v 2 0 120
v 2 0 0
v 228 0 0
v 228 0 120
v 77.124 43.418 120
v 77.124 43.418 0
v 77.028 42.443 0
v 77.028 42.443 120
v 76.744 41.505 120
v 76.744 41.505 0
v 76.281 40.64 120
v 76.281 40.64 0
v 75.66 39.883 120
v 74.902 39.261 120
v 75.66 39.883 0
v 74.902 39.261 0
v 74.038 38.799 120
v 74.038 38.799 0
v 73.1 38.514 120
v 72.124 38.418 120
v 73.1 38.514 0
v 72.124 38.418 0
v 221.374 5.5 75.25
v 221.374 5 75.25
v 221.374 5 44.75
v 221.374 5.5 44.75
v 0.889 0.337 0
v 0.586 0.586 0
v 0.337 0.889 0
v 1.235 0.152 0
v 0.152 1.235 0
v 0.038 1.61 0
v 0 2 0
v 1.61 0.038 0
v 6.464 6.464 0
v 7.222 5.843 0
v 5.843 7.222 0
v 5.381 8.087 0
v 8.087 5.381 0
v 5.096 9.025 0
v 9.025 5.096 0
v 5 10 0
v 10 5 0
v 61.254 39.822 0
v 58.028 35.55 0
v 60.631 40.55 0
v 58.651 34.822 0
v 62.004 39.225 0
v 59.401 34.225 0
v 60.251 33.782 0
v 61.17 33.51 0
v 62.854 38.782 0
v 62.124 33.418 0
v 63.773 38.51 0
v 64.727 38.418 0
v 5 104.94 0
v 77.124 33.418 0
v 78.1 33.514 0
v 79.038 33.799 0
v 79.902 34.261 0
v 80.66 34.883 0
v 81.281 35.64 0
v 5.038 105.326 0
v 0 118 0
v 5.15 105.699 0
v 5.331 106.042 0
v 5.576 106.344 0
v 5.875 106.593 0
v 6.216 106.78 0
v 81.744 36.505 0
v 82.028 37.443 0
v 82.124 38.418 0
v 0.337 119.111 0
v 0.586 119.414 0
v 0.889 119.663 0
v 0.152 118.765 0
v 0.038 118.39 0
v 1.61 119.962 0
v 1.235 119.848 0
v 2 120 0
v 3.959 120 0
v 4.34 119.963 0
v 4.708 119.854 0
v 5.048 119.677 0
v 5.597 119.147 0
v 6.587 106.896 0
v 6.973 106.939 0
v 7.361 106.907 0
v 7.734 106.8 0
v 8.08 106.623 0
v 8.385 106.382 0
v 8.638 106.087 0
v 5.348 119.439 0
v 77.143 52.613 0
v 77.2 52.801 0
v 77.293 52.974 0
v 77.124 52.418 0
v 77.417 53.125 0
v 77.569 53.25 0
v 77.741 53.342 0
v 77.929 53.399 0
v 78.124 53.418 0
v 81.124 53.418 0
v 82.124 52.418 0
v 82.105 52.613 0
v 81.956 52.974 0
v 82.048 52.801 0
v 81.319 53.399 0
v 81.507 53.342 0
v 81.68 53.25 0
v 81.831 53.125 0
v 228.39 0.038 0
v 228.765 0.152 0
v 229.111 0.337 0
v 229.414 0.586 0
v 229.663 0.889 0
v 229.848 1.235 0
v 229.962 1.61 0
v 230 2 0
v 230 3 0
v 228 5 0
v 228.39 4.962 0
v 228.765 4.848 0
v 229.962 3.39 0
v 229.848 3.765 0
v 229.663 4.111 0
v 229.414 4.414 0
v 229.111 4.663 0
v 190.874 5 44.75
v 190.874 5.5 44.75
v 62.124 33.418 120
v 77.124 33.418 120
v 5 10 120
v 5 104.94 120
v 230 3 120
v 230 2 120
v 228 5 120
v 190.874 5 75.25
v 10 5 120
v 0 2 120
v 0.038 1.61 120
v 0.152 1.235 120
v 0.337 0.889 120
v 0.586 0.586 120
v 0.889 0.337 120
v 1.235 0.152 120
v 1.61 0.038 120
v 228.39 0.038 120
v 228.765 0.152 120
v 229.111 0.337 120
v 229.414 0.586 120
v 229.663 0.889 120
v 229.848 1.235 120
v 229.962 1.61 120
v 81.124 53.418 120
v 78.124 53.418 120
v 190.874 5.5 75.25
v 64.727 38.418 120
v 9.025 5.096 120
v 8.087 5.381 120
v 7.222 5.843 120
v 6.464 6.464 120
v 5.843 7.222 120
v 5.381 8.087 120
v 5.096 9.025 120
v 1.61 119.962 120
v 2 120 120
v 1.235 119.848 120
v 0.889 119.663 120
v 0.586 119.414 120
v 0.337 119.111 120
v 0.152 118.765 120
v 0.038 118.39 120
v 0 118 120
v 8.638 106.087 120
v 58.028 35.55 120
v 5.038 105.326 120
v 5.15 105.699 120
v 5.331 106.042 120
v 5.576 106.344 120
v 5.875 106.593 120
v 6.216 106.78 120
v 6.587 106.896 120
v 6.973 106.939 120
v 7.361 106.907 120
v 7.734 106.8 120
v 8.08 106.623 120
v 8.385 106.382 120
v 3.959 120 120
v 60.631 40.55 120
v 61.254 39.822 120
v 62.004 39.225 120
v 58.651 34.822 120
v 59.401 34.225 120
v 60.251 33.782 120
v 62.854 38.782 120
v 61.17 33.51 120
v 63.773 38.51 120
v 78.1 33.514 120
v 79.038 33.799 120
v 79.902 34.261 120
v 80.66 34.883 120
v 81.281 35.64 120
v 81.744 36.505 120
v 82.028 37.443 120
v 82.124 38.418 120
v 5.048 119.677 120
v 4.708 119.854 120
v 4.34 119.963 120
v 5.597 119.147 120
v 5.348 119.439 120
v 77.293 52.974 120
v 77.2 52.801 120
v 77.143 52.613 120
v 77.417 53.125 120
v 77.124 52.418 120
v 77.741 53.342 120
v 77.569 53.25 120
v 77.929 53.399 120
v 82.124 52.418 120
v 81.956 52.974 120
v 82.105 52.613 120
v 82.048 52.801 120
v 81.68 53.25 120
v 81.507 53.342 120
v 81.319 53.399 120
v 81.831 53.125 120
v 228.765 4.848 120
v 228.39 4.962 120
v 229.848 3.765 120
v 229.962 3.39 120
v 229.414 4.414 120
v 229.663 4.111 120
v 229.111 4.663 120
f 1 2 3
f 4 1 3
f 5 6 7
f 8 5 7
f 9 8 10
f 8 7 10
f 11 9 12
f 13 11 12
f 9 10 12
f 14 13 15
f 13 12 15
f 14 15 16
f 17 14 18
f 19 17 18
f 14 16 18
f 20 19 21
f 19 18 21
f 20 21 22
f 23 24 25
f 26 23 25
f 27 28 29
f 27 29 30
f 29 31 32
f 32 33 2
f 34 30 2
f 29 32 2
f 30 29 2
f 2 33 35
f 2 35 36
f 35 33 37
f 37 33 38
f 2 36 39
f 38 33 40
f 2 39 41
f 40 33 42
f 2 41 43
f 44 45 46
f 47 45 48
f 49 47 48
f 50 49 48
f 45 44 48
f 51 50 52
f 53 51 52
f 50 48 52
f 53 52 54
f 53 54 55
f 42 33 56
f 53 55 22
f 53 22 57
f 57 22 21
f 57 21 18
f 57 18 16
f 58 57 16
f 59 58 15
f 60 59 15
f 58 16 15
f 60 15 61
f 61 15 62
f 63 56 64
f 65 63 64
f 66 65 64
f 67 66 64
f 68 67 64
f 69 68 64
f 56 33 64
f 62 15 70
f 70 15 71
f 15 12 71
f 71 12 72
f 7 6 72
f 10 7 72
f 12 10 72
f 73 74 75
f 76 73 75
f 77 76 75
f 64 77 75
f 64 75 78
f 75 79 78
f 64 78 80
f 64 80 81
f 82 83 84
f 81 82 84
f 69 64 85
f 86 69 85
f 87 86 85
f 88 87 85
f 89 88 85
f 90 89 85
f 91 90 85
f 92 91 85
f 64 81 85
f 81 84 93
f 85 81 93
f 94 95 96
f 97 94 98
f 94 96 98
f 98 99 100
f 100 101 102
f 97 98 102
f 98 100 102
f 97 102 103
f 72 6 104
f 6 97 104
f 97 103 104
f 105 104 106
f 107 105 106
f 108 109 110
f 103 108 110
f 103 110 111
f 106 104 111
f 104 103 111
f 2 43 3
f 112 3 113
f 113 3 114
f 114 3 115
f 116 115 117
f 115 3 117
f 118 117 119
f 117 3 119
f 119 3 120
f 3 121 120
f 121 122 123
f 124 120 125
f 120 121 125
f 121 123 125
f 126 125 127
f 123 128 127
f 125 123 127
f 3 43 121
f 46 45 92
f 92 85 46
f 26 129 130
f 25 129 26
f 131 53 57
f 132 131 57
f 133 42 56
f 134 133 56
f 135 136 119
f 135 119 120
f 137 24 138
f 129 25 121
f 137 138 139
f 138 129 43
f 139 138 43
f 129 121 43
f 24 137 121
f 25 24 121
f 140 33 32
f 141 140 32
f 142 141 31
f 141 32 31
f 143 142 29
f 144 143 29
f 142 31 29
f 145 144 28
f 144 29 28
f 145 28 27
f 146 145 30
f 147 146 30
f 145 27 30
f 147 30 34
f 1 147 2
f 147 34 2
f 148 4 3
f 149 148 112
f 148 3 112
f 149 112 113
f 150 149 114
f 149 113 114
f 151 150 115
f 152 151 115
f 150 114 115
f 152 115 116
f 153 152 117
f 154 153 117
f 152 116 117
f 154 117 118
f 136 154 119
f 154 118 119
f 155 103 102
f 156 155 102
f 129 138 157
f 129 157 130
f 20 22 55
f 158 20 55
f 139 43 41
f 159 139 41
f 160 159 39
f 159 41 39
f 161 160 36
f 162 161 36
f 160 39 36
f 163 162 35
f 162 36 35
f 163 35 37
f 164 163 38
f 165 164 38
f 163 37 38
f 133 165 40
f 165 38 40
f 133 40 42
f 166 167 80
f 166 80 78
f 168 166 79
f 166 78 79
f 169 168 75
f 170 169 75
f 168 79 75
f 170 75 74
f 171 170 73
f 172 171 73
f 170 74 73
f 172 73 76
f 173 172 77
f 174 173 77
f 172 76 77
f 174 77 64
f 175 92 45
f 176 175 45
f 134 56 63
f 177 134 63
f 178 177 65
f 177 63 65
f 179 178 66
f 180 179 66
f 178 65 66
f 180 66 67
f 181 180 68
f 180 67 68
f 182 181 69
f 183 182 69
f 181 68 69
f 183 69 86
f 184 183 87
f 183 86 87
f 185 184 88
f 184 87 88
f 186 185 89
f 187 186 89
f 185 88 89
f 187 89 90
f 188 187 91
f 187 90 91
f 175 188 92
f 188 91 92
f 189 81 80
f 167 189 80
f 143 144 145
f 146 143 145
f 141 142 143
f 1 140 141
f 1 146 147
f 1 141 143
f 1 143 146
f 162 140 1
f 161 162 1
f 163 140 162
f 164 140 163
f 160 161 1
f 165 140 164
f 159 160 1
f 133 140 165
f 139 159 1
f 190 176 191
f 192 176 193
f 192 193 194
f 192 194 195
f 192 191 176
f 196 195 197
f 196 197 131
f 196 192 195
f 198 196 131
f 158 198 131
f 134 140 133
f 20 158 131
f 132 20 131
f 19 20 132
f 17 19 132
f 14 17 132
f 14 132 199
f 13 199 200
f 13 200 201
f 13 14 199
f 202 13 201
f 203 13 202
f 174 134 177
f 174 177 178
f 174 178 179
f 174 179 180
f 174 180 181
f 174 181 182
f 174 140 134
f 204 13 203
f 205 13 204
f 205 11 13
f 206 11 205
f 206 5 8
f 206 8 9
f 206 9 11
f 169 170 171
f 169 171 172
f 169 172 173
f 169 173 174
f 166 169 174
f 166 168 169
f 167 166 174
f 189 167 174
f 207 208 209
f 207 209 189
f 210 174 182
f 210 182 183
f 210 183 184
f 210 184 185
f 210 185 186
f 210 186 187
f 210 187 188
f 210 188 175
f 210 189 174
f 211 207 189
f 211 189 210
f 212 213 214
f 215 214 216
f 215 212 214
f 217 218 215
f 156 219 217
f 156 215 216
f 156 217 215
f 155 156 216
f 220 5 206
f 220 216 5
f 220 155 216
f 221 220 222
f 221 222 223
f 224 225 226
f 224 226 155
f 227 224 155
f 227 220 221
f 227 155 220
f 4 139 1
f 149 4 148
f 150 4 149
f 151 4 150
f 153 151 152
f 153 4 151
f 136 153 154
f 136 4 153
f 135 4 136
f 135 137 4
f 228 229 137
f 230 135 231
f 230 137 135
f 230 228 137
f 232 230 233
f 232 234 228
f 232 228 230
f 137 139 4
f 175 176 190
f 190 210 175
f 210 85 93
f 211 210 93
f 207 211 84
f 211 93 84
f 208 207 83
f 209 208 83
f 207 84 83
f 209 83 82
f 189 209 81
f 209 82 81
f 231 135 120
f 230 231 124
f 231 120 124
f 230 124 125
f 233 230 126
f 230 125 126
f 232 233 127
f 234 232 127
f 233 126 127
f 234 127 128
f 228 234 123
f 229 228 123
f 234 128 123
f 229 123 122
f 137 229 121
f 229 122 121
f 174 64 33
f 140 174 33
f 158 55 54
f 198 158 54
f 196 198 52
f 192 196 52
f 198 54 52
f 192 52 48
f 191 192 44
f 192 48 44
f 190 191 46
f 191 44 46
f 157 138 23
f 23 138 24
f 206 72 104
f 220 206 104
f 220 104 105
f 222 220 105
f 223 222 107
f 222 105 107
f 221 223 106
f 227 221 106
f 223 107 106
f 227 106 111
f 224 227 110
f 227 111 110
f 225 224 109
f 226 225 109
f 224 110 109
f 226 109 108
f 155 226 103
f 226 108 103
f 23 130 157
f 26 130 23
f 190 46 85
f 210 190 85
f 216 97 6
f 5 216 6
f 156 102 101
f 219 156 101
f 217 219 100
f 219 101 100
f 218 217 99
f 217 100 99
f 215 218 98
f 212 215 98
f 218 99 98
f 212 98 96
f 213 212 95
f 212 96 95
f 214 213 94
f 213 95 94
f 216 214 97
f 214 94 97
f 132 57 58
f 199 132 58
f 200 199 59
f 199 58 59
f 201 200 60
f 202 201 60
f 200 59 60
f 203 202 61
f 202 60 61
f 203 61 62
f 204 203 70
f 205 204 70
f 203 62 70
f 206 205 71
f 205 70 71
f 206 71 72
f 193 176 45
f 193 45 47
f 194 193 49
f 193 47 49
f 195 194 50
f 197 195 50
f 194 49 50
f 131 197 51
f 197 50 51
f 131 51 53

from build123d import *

# Parameters (mm, degrees)
BOSS_EXTRUDE1_DEPTH = 120
SKETCH3_W           = 30
SKETCH3_H           = 30
BOSS_EXTRUDE2_DEPTH = 3
SKETCH6_W           = 30.5
SKETCH6_H           = 30.5
BOSS_EXTRUDE3_DEPTH = 5.5


with BuildPart() as part:
    # Sketch1 → Boss-Extrude1 (new body)
    with BuildSketch(Plane.XY):
        with BuildLine():
            Line((2, 0), (228, 0))
            ThreePointArc((228, 0), (229.414213562, 0.585786438), (230, 2))
            Line((230, 2), (230, 3))
            ThreePointArc((230, 3), (229.414213562, 4.414213562), (228, 5))
            Line((228, 5), (10, 5))
            ThreePointArc((10, 5), (6.464466094, 6.464466094), (5, 10))
            Line((5, 10), (5, 104.939576417))
            ThreePointArc((5, 104.939576417), (6.398588401, 106.847010319), (8.638304089, 106.08672929))
            Line((8.638304089, 106.08672929), (58.028349014, 35.550435076))
            ThreePointArc((58.028349014, 35.550435076), (59.815366169, 33.983263092), (62.124109236, 33.418317258))
            Line((62.124109236, 33.418317258), (77.124109236, 33.418317258))
            ThreePointArc((77.124109236, 33.418317258), (80.659643142, 34.882783352), (82.124109236, 38.418317258))
            Line((82.124109236, 38.418317258), (82.124109236, 52.418317258))
            ThreePointArc((82.124109236, 52.418317258), (81.831216017, 53.125424039), (81.124109236, 53.418317258))
            Line((81.124109236, 53.418317258), (78.124109236, 53.418317258))
            ThreePointArc((78.124109236, 53.418317258), (77.417002454, 53.125424039), (77.124109236, 52.418317258))
            Line((77.124109236, 52.418317258), (77.124109236, 43.418317258))
            ThreePointArc((77.124109236, 43.418317258), (75.659643142, 39.882783352), (72.124109236, 38.418317258))
            Line((72.124109236, 38.418317258), (64.726944488, 38.418317258))
            ThreePointArc((64.726944488, 38.418317258), (62.418201422, 38.983263092), (60.631184267, 40.550435076))
            Line((60.631184267, 40.550435076), (5.597169987, 119.147152873))
            ThreePointArc((5.597169987, 119.147152873), (4.882363125, 119.774021666), (3.958865899, 120))
            Line((3.958865899, 120), (2, 120))
            ThreePointArc((2, 120), (0.585786438, 119.414213562), (0, 118))
            Line((0, 118), (0, 2))
            ThreePointArc((0, 2), (0.585786438, 0.585786438), (2, 0))
        make_face()
    extrude(amount=BOSS_EXTRUDE1_DEPTH)

    # Sketch3 → Boss-Extrude2 (add)
    with BuildSketch(Plane(origin=(0, 0, 0), x_dir=(1, 0, 0), z_dir=(0, 1, 0))):
        with Locations((205, -60)):
            Rectangle(SKETCH3_W, SKETCH3_H)
    extrude(amount=BOSS_EXTRUDE2_DEPTH)

    # Sketch6 → Boss-Extrude3 (add)
    with BuildSketch(Plane(origin=(0, 0, 0), x_dir=(1, 0, 0), z_dir=(0, 1, 0))):
        with Locations((206.124109236, -60)):
            Rectangle(SKETCH6_W, SKETCH6_H)
    extrude(amount=BOSS_EXTRUDE3_DEPTH)


solid = part.part
